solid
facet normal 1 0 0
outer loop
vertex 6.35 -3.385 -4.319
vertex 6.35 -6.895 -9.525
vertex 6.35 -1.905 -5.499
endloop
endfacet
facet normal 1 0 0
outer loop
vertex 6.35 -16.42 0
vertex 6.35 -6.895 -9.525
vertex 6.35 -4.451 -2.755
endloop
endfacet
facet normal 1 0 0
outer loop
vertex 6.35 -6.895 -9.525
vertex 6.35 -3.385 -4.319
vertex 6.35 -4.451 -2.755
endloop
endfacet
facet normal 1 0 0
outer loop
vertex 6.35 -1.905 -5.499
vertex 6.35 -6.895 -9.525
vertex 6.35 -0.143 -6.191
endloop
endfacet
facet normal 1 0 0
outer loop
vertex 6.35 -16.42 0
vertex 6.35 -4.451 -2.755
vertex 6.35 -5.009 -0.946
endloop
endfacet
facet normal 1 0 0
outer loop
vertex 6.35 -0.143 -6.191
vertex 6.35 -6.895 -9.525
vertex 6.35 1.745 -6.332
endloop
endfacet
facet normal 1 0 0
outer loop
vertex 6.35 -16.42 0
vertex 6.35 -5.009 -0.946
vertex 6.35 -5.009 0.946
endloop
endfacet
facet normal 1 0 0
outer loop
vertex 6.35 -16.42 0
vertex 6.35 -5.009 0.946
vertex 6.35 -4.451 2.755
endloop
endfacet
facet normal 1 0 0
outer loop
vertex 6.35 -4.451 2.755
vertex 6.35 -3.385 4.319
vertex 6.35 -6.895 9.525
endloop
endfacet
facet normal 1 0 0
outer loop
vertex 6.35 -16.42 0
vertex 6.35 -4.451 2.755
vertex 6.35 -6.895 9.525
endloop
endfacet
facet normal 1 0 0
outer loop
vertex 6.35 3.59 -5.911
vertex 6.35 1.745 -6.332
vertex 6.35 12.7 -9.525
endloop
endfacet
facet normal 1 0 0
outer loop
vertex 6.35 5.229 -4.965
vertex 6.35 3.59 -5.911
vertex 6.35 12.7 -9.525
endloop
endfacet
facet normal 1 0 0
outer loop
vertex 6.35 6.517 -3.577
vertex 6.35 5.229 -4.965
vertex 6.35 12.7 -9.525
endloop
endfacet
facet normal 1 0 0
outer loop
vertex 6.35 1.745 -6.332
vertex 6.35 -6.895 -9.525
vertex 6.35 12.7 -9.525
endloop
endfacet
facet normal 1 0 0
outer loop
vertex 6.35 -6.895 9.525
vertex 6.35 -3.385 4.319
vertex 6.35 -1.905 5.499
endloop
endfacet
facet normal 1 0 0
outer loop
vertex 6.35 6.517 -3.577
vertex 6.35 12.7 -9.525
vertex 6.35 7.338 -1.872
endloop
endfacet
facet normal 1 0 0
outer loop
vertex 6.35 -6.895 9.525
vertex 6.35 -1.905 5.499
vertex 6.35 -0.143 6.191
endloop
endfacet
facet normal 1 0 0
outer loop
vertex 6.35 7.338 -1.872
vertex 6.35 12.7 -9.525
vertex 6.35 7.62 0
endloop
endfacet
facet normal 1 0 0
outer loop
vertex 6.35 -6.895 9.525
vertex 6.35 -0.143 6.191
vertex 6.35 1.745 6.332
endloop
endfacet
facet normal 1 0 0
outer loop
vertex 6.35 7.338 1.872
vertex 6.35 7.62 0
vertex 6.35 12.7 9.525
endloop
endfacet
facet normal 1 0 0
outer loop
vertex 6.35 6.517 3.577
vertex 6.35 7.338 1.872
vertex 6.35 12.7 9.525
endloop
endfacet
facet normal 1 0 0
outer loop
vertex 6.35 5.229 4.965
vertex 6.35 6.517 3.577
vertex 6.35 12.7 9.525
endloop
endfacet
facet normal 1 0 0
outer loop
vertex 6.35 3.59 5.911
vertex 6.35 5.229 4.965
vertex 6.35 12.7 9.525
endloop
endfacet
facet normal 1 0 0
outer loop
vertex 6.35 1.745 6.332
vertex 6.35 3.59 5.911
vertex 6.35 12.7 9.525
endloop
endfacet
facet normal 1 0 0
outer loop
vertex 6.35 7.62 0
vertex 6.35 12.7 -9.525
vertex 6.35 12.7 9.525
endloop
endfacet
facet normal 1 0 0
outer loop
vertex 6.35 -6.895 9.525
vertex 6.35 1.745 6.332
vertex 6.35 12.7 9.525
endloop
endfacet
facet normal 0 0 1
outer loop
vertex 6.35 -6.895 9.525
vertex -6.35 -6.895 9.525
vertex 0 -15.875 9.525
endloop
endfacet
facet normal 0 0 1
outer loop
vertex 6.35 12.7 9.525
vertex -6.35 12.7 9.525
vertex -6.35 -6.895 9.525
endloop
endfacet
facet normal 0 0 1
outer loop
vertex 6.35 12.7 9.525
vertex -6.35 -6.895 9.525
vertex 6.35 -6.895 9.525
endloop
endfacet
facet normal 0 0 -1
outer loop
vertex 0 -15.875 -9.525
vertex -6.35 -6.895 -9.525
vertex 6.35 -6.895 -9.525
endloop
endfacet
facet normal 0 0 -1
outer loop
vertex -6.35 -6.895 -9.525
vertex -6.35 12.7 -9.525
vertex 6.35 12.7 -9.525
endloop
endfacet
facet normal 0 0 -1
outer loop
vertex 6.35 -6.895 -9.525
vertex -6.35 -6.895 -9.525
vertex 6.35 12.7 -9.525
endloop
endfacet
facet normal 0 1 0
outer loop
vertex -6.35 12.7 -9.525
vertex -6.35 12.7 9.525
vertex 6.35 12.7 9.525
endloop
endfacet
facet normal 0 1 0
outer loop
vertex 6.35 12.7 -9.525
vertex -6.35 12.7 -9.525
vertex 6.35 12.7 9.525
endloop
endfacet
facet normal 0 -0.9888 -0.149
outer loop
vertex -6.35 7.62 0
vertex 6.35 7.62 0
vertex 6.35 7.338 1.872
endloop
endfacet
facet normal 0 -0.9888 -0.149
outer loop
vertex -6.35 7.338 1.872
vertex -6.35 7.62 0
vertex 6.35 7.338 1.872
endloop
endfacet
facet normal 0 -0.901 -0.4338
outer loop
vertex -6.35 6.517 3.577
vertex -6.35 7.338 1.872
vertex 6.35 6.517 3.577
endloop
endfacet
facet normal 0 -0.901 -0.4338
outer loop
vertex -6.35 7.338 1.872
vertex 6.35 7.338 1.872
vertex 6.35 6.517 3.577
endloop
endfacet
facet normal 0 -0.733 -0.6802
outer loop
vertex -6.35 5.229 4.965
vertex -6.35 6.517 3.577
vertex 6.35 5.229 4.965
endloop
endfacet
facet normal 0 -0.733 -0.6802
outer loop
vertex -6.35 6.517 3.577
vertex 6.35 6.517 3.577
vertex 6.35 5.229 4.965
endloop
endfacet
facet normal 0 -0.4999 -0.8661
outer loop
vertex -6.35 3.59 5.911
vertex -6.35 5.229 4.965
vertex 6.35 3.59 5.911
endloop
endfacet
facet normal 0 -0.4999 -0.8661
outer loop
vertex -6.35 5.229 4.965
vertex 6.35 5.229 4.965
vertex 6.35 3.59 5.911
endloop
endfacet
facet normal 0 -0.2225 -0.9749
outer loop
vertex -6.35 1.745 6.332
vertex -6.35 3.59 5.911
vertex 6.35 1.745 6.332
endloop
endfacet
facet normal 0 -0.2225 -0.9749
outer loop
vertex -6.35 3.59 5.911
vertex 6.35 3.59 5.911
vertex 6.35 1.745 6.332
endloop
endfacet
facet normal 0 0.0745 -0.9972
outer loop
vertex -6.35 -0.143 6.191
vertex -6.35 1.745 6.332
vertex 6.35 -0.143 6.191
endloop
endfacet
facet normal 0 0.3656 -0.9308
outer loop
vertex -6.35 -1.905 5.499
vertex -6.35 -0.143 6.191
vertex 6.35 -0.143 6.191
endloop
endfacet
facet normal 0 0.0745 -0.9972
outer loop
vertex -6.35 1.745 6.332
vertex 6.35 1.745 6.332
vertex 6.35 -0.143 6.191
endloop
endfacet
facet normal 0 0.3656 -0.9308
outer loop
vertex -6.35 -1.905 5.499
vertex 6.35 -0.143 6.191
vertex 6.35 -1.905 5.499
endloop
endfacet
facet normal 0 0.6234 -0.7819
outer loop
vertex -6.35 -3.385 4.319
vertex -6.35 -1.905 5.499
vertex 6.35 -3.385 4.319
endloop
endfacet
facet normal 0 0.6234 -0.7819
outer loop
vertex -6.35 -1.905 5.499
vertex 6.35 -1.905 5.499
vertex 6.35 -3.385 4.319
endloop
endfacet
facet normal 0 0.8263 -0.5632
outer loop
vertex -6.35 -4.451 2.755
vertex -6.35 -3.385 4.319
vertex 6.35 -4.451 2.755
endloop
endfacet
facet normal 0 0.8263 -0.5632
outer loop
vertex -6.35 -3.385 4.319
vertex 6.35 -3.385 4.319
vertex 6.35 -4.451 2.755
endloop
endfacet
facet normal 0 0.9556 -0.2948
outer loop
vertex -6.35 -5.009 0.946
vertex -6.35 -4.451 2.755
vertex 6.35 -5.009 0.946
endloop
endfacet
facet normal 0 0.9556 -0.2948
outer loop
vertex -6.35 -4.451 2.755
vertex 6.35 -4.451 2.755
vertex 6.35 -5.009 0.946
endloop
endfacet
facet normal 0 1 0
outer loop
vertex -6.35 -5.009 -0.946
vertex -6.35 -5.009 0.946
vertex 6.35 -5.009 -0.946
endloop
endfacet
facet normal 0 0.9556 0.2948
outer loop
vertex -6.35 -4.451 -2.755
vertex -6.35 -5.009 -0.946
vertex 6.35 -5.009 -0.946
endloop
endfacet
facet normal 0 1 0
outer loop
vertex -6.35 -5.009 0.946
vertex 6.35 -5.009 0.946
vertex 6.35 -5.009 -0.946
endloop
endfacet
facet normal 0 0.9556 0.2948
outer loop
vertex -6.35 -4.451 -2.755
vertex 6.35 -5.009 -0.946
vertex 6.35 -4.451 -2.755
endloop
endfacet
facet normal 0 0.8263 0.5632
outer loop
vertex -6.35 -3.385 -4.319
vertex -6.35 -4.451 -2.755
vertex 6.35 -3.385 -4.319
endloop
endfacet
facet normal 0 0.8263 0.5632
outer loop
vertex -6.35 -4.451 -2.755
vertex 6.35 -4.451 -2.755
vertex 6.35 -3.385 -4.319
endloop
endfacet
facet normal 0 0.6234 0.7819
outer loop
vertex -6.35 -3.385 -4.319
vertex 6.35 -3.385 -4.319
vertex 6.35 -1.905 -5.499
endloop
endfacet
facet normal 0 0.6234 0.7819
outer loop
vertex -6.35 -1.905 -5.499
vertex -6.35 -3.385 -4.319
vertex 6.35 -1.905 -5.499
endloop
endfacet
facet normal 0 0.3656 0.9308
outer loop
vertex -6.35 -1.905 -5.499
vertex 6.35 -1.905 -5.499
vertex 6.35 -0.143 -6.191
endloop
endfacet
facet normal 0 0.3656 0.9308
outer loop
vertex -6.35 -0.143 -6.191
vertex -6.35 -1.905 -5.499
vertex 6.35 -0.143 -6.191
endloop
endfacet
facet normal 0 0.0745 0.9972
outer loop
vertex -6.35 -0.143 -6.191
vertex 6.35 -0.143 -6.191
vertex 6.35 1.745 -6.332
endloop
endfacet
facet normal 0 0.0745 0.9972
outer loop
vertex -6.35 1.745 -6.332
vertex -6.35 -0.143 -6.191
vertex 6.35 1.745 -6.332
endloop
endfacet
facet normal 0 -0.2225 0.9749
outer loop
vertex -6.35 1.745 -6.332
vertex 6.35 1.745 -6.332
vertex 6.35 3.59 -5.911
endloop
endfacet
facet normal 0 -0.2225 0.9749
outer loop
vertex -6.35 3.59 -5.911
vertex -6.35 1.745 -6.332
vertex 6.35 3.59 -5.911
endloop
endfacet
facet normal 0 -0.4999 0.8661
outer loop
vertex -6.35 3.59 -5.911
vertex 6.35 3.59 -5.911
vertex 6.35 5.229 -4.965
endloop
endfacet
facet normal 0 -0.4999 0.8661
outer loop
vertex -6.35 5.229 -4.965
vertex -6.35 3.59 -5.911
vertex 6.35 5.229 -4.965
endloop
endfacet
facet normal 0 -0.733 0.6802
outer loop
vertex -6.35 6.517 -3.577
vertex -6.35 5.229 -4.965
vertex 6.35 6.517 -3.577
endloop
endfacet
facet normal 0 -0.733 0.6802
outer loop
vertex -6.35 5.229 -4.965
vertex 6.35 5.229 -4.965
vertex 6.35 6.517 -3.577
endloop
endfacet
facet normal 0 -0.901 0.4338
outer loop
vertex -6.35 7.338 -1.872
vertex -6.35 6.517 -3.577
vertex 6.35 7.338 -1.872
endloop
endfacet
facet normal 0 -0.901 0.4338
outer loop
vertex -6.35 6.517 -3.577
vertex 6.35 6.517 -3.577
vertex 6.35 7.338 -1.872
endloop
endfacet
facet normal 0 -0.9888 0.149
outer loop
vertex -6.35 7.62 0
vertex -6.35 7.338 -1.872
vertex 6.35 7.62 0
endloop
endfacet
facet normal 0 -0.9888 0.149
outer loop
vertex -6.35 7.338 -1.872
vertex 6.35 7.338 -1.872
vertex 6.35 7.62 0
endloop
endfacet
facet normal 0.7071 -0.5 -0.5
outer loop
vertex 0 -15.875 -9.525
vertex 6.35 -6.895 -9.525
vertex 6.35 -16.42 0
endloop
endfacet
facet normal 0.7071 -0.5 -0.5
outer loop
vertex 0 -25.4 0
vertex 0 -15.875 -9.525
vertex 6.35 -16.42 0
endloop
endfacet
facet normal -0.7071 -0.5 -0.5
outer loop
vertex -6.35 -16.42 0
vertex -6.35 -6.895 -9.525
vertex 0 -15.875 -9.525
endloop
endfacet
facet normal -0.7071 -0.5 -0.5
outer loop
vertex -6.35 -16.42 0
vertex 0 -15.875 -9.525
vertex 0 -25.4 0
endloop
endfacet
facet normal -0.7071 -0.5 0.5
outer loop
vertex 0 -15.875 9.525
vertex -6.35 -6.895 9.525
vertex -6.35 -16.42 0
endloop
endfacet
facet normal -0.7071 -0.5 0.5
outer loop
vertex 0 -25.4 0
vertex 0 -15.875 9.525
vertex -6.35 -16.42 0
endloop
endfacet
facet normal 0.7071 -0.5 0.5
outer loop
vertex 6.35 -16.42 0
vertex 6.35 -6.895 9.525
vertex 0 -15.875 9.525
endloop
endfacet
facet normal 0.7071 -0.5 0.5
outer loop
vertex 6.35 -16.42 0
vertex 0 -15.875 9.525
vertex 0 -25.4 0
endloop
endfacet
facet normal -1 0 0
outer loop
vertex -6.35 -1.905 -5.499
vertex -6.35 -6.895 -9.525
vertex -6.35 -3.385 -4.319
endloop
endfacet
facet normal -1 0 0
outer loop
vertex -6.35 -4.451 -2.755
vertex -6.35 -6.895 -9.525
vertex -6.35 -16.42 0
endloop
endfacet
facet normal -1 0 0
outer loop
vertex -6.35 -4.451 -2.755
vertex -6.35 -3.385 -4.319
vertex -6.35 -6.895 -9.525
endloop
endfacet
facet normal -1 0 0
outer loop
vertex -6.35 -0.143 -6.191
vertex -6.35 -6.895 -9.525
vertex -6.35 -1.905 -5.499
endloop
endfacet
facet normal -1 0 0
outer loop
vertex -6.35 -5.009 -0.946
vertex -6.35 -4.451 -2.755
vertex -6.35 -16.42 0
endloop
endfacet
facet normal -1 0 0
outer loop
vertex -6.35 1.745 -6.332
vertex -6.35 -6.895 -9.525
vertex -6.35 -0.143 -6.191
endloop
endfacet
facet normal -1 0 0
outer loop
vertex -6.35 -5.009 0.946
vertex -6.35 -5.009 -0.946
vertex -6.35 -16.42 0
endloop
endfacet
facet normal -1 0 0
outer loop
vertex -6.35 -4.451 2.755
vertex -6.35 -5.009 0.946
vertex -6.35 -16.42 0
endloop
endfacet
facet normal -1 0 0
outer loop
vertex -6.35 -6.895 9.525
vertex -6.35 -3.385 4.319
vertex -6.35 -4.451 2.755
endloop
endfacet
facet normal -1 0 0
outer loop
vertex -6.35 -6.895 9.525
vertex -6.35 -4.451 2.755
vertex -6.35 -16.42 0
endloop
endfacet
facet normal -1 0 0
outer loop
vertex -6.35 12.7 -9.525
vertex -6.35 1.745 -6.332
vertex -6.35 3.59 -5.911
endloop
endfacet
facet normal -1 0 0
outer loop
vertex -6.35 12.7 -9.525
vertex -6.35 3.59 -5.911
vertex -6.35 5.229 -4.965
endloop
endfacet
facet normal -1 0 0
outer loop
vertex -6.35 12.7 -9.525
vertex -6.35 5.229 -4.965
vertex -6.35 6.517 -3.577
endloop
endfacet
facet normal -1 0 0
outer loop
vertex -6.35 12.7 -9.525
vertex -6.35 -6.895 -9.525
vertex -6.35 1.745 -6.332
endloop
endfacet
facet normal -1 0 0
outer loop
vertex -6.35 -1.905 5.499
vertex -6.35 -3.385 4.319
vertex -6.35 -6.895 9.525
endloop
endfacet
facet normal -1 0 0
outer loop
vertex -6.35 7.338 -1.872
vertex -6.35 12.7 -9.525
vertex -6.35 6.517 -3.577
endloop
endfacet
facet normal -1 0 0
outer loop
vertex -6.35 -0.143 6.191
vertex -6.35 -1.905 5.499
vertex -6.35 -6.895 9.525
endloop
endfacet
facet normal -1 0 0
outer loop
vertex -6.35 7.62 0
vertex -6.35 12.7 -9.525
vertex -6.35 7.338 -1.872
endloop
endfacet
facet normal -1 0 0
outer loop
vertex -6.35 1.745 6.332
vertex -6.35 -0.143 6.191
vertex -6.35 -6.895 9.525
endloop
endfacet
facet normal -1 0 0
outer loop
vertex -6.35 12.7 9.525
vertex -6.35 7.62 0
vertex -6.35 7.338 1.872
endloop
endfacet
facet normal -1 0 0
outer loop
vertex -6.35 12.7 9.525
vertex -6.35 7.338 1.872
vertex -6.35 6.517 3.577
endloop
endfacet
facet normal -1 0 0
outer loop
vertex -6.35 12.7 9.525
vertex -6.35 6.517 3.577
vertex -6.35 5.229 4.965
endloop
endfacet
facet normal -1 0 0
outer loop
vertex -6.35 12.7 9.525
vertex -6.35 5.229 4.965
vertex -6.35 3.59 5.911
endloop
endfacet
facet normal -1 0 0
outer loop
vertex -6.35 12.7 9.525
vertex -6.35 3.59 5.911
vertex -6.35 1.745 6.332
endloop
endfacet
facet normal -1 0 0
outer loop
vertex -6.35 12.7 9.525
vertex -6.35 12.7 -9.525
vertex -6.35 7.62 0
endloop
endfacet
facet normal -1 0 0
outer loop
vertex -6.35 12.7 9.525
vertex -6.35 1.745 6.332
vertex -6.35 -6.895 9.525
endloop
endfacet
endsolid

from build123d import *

# Parameters (mm, degrees)
F0_W      = 12.7
F0_H      = 19.05
F1_DEPTH  = 12.7
F2_W      = 12.7
F2_H      = 19.05
F3_DEPTH  = 12.7
F4_SIZE   = 9.52499
F5_SIZE   = 6.35
F5_SIZE_2 = 6.34999
F6_R      = 6.35
F7_DEPTH  = 12.7


# Not quite as in the source:
# - a fillet or chamfer is up to 0.001 mm smaller than in the source, because OpenCascade refuses the exact size


with BuildPart() as f1:
    # F0 (on Front) → F1 (new body, symmetric)
    with BuildSketch(Plane.XZ):
        Rectangle(F0_W, F0_H)
    extrude(amount=F1_DEPTH, both=True)

    # F2 (on face) → F3 (join)
    with BuildSketch(Plane.XZ.offset(12.7)):
        Rectangle(F2_W, F2_H)
    extrude(amount=F3_DEPTH)

    # F4 (size 9.525 in the source; OpenCascade refuses exactly that, so slightly less here)
    f4_edges = [f1.edges().sort_by_distance(p)[0] for p in [
        (0, -25.4, 9.525),
        (0, -25.4, -9.525),
    ]]
    chamfer(f4_edges, length=F4_SIZE)

    # F5 (call 1 of 4: OpenCascade refuses the feature's edges together)
    f5_edges = [f1.edges().sort_by_distance(p)[0] for p in [
        (-6.35, -20.637505, 4.762505),
    ]]
    chamfer(f5_edges, length=F5_SIZE)

    # F5#2 (call 2 of 4)
    f5_2_edges = [f1.edges().sort_by_distance(p)[0] for p in [
        (-6.35, -20.637505, -4.762505),
    ]]
    chamfer(f5_2_edges, length=F5_SIZE)

    # F5#3 (call 3 of 4) (size 6.35 in the source; OpenCascade refuses exactly that, so slightly less here)
    f5_3_edges = [f1.edges().sort_by_distance(p)[0] for p in [
        (6.35, -20.637505, 4.762505),
    ]]
    chamfer(f5_3_edges, length=F5_SIZE_2)

    # F5#4 (call 4 of 4) (size 6.35 in the source; OpenCascade refuses exactly that, so slightly less here)
    f5_4_edges = [f1.edges().sort_by_distance(p)[0] for p in [
        (6.35, -20.637505, -4.762505),
    ]]
    chamfer(f5_4_edges, length=F5_SIZE_2)

    # F6 (on face) → F7 (cut)
    with BuildSketch(Plane.YZ.offset(6.35)):
        with Locations((1.27, 0)):
            Circle(F6_R)
    extrude(amount=-F7_DEPTH, mode=Mode.SUBTRACT)


solid = f1.part
